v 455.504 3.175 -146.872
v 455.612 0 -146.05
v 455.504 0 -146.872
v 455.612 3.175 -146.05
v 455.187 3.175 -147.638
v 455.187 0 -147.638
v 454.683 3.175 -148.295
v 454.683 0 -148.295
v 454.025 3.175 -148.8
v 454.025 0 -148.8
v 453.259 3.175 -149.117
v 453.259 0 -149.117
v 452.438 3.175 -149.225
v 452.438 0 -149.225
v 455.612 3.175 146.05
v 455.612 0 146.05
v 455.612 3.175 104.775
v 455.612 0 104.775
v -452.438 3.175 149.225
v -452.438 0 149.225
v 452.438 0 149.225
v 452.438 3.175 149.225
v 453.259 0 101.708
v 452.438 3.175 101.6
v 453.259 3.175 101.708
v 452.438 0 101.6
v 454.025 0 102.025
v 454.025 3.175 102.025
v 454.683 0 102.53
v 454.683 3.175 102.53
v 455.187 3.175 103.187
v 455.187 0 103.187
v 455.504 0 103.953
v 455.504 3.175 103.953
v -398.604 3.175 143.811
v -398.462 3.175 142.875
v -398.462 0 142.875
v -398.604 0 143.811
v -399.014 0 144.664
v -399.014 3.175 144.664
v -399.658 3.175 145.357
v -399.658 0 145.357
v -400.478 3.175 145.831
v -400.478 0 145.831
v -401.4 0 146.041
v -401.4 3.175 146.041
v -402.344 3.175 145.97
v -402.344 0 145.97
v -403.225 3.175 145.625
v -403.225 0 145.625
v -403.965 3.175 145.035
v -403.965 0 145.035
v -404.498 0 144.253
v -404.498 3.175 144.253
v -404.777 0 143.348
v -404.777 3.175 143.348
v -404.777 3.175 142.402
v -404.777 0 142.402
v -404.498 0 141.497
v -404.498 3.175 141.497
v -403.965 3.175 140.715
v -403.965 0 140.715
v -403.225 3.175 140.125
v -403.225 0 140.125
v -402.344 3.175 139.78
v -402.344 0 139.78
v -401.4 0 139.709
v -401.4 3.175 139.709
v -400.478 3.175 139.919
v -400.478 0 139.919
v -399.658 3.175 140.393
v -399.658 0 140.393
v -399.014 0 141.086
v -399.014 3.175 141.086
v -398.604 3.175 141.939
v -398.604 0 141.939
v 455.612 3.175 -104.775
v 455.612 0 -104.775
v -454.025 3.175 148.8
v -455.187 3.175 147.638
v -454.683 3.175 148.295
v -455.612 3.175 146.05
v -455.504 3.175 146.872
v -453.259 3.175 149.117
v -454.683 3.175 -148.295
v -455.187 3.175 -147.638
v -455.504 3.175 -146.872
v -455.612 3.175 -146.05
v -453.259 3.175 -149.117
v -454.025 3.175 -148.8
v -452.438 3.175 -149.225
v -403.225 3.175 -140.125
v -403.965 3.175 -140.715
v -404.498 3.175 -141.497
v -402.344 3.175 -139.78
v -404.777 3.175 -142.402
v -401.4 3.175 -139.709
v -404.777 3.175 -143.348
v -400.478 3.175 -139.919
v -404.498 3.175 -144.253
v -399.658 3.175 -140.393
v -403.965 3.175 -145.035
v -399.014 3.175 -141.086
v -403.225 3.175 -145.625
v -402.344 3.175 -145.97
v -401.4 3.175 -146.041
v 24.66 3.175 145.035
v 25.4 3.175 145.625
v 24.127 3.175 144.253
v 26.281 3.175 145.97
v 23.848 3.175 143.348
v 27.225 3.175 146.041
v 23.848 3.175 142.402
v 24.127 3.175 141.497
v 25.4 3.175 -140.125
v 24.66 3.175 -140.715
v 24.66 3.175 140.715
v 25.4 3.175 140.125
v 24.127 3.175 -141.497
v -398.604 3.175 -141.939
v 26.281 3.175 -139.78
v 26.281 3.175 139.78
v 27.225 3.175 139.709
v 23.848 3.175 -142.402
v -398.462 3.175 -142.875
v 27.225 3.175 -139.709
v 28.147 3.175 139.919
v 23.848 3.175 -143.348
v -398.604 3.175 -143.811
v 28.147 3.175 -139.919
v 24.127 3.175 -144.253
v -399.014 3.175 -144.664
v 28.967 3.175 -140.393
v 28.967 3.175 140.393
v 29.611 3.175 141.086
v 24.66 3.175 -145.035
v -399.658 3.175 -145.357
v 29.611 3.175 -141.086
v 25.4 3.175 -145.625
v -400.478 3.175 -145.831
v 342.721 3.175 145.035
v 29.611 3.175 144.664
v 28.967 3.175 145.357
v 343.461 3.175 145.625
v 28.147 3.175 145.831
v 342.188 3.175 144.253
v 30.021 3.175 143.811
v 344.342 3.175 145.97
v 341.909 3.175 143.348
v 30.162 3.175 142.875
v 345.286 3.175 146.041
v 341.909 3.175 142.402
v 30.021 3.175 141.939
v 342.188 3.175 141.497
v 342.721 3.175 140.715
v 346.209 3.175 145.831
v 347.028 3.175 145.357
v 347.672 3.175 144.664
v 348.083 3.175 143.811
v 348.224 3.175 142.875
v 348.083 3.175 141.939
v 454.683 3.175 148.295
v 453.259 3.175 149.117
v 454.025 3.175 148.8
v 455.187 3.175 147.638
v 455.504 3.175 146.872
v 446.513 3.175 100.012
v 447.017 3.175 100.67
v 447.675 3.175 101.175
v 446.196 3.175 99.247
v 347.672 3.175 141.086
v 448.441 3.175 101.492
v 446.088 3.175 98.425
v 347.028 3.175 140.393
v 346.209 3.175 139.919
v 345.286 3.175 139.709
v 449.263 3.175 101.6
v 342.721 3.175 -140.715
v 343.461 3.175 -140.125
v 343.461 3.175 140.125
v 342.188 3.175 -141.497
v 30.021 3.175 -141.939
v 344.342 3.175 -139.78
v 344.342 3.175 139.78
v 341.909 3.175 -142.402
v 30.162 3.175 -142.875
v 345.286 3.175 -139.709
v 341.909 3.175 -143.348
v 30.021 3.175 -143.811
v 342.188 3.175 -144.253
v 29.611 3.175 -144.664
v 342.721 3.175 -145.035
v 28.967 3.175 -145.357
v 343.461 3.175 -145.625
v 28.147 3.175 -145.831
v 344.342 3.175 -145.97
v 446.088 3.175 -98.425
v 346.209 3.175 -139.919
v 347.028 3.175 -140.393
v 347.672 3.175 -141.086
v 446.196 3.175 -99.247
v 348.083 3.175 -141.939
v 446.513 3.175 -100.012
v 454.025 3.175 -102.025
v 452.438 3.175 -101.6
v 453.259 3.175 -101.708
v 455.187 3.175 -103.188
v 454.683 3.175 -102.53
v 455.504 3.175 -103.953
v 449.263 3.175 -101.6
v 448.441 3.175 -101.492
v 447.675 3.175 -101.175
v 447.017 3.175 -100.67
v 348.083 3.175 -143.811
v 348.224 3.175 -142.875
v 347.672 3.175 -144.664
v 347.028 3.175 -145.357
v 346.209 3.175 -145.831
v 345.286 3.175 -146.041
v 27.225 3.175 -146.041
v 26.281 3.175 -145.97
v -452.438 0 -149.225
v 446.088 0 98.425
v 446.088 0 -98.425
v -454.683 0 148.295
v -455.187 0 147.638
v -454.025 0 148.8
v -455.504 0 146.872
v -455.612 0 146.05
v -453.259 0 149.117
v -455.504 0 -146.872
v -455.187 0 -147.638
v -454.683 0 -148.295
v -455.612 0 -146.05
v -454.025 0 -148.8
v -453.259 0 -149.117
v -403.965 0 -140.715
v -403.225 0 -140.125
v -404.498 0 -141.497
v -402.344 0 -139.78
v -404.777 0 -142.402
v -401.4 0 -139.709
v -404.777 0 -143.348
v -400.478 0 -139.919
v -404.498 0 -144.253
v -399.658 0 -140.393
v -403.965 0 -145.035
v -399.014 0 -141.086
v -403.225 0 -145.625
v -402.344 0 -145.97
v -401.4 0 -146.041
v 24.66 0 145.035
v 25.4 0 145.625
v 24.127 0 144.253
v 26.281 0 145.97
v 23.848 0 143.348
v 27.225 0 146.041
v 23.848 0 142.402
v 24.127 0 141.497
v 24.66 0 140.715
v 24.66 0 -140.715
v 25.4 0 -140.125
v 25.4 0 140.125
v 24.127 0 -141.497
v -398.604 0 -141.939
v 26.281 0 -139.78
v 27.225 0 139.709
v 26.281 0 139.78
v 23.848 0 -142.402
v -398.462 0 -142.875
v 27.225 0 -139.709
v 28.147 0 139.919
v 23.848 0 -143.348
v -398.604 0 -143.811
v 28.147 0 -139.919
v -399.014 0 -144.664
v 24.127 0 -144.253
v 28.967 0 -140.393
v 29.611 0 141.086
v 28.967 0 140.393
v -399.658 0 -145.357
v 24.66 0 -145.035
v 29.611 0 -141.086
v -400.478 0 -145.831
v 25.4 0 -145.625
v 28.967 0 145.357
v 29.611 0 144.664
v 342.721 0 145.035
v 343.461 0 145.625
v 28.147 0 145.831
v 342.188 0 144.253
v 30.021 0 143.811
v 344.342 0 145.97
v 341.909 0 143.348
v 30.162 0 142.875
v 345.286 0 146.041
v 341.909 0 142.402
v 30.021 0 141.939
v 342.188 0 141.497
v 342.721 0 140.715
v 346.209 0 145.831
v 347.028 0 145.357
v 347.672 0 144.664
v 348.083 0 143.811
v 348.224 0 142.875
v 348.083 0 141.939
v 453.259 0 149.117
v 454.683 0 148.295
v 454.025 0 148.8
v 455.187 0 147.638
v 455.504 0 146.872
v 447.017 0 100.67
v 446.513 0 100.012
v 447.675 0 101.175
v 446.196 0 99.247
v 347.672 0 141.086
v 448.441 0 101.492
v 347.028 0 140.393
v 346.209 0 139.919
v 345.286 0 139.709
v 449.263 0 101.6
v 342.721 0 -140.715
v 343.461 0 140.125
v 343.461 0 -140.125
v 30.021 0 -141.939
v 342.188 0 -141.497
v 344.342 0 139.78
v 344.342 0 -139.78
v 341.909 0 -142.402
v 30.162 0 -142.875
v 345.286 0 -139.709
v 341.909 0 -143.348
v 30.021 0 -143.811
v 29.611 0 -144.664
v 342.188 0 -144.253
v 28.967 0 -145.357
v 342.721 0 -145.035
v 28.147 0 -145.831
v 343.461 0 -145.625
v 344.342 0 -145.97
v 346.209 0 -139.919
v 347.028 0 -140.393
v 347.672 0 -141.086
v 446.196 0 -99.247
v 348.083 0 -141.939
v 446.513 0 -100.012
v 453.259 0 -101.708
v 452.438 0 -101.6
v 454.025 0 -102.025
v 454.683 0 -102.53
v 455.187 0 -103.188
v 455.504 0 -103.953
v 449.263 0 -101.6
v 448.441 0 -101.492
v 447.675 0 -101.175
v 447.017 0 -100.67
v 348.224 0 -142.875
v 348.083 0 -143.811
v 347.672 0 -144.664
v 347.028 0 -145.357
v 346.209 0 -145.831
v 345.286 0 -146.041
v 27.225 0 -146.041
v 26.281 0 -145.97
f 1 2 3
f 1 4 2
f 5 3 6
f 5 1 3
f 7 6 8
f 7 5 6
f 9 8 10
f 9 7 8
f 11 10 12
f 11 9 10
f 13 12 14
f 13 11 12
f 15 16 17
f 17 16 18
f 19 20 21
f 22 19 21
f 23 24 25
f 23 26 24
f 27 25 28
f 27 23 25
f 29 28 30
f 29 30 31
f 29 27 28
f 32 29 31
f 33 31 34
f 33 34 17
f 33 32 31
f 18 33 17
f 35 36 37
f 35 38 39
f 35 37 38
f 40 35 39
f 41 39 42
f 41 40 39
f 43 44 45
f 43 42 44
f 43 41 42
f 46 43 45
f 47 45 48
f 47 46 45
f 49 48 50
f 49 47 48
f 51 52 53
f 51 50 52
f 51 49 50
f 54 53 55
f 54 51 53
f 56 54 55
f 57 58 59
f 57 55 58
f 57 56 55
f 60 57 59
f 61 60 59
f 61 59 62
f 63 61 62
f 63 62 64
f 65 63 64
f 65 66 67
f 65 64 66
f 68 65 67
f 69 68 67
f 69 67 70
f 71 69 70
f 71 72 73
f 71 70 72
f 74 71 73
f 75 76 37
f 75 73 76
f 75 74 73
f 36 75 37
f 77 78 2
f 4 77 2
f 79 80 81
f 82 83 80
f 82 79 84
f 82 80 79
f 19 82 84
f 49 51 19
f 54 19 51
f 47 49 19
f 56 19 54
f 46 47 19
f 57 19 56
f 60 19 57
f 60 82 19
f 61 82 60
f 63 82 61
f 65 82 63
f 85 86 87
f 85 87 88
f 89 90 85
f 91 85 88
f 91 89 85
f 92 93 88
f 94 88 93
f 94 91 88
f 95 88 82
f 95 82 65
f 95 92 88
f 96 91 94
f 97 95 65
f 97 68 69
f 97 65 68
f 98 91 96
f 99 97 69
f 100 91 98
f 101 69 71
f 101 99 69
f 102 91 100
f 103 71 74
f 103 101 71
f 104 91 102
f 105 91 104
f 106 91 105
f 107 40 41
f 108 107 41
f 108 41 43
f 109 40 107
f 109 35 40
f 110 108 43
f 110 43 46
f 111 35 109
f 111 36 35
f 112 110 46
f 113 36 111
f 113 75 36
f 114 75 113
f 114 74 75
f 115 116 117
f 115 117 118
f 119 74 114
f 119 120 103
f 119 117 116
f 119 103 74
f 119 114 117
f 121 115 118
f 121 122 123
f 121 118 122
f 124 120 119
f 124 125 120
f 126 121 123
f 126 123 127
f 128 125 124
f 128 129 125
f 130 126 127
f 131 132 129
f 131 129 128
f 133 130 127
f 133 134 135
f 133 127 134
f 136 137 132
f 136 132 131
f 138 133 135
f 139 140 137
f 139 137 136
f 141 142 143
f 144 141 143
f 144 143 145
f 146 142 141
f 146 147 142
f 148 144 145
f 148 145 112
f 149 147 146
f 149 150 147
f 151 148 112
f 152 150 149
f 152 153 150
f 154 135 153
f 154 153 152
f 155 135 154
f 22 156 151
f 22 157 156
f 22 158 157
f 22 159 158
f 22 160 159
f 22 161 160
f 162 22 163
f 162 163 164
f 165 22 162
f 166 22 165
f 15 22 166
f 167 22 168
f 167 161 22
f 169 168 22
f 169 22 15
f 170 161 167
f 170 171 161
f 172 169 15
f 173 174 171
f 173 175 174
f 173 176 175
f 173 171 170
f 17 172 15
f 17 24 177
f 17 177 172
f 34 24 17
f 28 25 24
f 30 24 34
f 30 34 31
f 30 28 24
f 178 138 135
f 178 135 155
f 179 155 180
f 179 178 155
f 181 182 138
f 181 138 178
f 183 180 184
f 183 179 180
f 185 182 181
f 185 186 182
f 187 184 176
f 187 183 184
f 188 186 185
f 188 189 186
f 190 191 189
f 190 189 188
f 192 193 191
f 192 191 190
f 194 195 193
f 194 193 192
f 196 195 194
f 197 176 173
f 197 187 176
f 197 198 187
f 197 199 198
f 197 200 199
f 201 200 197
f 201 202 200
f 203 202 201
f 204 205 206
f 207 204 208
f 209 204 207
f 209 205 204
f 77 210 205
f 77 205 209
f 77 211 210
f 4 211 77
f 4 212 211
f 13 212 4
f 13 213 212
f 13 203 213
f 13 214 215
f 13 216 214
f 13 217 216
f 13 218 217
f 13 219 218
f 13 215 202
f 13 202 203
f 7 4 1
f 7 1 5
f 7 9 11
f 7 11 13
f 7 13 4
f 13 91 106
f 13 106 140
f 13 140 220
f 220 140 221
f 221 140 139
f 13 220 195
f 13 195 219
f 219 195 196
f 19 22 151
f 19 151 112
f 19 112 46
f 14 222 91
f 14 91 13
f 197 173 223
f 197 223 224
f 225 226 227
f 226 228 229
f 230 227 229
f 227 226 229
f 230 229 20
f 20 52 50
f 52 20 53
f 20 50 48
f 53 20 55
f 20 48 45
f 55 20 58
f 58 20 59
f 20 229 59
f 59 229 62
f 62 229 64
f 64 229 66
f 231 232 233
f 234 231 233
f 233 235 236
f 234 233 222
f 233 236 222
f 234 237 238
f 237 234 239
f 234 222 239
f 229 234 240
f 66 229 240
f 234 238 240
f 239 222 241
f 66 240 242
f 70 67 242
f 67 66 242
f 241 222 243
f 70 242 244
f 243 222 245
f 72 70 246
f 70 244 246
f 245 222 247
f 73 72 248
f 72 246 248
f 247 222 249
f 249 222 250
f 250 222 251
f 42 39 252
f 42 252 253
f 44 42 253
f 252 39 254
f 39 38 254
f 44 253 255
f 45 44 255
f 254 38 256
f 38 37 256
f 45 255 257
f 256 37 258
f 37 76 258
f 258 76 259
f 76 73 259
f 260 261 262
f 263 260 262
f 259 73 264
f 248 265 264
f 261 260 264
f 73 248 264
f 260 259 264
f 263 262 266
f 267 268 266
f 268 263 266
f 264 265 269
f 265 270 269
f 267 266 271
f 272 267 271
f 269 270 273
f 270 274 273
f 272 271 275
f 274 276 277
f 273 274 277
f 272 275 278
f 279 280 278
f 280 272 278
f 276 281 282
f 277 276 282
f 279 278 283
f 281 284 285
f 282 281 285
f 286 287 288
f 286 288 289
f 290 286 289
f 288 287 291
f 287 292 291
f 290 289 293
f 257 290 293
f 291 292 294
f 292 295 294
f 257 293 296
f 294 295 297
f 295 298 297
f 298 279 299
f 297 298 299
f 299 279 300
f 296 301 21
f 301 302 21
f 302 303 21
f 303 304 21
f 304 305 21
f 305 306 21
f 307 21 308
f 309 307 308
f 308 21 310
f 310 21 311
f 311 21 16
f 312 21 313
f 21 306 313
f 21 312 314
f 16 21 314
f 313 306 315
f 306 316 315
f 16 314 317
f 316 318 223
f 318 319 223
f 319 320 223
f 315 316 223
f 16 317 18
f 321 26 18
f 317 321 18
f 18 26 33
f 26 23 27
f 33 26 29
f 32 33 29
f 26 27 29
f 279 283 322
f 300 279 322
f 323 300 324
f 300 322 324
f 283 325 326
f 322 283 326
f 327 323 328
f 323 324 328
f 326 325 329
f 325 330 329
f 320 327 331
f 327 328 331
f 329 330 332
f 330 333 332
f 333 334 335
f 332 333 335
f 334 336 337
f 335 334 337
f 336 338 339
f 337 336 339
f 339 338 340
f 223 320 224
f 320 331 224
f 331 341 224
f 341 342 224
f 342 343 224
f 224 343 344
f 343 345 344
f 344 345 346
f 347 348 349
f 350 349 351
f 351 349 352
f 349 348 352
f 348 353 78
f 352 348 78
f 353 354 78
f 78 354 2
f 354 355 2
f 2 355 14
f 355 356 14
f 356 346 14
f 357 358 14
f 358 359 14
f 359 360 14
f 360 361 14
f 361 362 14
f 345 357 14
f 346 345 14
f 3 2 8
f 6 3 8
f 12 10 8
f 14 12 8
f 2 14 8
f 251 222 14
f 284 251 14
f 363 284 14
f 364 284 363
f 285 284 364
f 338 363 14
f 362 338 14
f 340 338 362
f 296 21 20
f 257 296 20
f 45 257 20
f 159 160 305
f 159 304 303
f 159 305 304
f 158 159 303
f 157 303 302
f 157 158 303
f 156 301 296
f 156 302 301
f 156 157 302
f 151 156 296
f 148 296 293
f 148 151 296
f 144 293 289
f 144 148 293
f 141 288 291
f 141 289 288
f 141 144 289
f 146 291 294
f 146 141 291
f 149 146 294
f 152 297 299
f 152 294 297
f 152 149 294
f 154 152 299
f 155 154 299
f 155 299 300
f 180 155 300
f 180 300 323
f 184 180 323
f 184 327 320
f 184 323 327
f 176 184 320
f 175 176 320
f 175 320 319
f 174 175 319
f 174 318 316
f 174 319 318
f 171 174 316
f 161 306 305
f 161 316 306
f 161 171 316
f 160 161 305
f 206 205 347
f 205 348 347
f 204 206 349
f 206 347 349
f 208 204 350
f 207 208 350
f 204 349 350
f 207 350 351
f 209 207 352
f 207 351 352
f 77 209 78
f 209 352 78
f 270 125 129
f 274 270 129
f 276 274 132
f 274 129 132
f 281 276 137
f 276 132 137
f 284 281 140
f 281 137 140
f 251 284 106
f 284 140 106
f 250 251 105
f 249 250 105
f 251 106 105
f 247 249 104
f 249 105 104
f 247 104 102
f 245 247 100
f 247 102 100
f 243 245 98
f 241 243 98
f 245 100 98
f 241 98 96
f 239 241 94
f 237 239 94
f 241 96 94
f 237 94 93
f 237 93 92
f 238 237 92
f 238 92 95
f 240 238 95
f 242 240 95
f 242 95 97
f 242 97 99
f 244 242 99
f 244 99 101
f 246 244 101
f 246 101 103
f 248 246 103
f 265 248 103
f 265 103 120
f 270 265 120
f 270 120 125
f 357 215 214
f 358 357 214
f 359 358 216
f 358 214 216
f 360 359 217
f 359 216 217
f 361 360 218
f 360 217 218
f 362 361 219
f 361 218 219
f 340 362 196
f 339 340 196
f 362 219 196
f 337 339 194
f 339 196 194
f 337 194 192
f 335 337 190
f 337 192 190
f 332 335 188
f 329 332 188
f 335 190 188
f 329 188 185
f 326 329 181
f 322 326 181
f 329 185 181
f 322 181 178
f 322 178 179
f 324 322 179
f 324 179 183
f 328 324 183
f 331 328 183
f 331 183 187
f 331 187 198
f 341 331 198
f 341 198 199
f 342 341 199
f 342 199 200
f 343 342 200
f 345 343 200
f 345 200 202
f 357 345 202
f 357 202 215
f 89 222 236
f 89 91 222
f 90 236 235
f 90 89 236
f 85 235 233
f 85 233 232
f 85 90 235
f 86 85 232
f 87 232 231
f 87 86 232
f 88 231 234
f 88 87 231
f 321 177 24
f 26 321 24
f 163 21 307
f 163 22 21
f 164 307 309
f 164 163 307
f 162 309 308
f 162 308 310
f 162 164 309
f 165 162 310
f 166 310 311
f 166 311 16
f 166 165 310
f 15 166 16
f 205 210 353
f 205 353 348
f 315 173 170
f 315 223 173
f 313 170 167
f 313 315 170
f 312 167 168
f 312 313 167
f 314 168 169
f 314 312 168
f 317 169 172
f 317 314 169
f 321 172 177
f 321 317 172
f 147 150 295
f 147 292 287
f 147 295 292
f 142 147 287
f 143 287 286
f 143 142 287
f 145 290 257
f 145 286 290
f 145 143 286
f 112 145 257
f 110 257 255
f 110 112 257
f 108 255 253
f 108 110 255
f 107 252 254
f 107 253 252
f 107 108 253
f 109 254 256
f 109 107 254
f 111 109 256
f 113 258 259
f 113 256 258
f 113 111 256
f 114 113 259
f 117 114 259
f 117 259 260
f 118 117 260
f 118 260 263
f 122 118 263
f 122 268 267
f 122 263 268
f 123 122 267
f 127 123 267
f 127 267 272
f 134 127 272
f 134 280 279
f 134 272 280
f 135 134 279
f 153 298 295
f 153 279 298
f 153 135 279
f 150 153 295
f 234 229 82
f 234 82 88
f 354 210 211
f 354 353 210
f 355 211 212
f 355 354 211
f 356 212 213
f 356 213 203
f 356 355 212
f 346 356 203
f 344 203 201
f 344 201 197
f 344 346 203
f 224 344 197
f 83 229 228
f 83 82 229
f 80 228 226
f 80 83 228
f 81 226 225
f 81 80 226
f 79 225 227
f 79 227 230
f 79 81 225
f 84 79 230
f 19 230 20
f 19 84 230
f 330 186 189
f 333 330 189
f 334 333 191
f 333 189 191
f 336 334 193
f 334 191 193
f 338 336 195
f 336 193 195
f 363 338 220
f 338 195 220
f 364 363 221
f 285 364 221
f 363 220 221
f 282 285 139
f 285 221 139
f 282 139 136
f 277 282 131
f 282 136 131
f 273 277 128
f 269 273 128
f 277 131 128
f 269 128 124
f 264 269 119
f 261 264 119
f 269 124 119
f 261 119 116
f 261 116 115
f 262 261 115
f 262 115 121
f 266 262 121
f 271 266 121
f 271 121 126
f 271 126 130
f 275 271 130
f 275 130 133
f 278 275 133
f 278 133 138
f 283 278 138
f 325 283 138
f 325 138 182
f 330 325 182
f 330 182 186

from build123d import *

# Parameters (mm, degrees)
SKETCH1_W                   = 911.225
SKETCH1_H                   = 298.45
BOSS_EXTRUDE1_DEPTH         = 3.175
SKETCH2_W                   = 9.525
SKETCH2_H                   = 203.2
CUT_EXTRUDE1_DEPTH          = 4.175
FILLET1_R                   = 3.175
F_1_4_0_25_DIAMETER_HOLE1_D = 6.35
FILLET2_R                   = 3.175


with BuildPart() as part:
    # Sketch1 → Boss-Extrude1 (new body)
    with BuildSketch(Plane(origin=(0, 0, 0), x_dir=(1, 0, 0), z_dir=(0, 1, 0))):
        Rectangle(SKETCH1_W, SKETCH1_H)
    extrude(amount=BOSS_EXTRUDE1_DEPTH)

    # Sketch2 → Cut-Extrude1 (cut, through all)
    with BuildSketch(Plane(origin=(0, 3.175, 0), x_dir=(1, 0, 0), z_dir=(0, 1, 0))):
        with Locations((450.85, 0)):
            Rectangle(SKETCH2_W, SKETCH2_H)
    extrude(amount=-CUT_EXTRUDE1_DEPTH, mode=Mode.SUBTRACT)

    # Fillet1
    fillet1_edges = [part.edges().sort_by_distance(p)[0] for p in [
        (446.0875, 1.5875, 101.6),
        (446.0875, 1.5875, -101.6),
    ]]
    fillet(fillet1_edges, radius=FILLET1_R)

    # 1/4 (0.25) Diameter Hole1 (through all)
    with Locations(Plane(origin=(0, 0, 0), x_dir=(-1, 0, 0), z_dir=(0, -1, 0))):
        with Locations((-345.04884, 142.875), (401.6375, 142.875), (-26.9875, 142.875)):
            f_1_4_0_25_diameter_hole1 = Hole(F_1_4_0_25_DIAMETER_HOLE1_D / 2)

    # Mirror1: 1/4 (0.25) Diameter Hole1 across plane
    add(f_1_4_0_25_diameter_hole1.mirror(Plane.XY), mode=Mode.SUBTRACT)

    # Fillet2
    fillet2_edges = [part.edges().sort_by_distance(p)[0] for p in [
        (455.6125, 1.5875, -101.6),
        (455.6125, 1.5875, 101.6),
        (455.6125, 1.5875, 149.225),
        (-455.6125, 1.5875, 149.225),
        (-455.6125, 1.5875, -149.225),
        (455.6125, 1.5875, -149.225),
    ]]
    fillet(fillet2_edges, radius=FILLET2_R)


solid = part.part
